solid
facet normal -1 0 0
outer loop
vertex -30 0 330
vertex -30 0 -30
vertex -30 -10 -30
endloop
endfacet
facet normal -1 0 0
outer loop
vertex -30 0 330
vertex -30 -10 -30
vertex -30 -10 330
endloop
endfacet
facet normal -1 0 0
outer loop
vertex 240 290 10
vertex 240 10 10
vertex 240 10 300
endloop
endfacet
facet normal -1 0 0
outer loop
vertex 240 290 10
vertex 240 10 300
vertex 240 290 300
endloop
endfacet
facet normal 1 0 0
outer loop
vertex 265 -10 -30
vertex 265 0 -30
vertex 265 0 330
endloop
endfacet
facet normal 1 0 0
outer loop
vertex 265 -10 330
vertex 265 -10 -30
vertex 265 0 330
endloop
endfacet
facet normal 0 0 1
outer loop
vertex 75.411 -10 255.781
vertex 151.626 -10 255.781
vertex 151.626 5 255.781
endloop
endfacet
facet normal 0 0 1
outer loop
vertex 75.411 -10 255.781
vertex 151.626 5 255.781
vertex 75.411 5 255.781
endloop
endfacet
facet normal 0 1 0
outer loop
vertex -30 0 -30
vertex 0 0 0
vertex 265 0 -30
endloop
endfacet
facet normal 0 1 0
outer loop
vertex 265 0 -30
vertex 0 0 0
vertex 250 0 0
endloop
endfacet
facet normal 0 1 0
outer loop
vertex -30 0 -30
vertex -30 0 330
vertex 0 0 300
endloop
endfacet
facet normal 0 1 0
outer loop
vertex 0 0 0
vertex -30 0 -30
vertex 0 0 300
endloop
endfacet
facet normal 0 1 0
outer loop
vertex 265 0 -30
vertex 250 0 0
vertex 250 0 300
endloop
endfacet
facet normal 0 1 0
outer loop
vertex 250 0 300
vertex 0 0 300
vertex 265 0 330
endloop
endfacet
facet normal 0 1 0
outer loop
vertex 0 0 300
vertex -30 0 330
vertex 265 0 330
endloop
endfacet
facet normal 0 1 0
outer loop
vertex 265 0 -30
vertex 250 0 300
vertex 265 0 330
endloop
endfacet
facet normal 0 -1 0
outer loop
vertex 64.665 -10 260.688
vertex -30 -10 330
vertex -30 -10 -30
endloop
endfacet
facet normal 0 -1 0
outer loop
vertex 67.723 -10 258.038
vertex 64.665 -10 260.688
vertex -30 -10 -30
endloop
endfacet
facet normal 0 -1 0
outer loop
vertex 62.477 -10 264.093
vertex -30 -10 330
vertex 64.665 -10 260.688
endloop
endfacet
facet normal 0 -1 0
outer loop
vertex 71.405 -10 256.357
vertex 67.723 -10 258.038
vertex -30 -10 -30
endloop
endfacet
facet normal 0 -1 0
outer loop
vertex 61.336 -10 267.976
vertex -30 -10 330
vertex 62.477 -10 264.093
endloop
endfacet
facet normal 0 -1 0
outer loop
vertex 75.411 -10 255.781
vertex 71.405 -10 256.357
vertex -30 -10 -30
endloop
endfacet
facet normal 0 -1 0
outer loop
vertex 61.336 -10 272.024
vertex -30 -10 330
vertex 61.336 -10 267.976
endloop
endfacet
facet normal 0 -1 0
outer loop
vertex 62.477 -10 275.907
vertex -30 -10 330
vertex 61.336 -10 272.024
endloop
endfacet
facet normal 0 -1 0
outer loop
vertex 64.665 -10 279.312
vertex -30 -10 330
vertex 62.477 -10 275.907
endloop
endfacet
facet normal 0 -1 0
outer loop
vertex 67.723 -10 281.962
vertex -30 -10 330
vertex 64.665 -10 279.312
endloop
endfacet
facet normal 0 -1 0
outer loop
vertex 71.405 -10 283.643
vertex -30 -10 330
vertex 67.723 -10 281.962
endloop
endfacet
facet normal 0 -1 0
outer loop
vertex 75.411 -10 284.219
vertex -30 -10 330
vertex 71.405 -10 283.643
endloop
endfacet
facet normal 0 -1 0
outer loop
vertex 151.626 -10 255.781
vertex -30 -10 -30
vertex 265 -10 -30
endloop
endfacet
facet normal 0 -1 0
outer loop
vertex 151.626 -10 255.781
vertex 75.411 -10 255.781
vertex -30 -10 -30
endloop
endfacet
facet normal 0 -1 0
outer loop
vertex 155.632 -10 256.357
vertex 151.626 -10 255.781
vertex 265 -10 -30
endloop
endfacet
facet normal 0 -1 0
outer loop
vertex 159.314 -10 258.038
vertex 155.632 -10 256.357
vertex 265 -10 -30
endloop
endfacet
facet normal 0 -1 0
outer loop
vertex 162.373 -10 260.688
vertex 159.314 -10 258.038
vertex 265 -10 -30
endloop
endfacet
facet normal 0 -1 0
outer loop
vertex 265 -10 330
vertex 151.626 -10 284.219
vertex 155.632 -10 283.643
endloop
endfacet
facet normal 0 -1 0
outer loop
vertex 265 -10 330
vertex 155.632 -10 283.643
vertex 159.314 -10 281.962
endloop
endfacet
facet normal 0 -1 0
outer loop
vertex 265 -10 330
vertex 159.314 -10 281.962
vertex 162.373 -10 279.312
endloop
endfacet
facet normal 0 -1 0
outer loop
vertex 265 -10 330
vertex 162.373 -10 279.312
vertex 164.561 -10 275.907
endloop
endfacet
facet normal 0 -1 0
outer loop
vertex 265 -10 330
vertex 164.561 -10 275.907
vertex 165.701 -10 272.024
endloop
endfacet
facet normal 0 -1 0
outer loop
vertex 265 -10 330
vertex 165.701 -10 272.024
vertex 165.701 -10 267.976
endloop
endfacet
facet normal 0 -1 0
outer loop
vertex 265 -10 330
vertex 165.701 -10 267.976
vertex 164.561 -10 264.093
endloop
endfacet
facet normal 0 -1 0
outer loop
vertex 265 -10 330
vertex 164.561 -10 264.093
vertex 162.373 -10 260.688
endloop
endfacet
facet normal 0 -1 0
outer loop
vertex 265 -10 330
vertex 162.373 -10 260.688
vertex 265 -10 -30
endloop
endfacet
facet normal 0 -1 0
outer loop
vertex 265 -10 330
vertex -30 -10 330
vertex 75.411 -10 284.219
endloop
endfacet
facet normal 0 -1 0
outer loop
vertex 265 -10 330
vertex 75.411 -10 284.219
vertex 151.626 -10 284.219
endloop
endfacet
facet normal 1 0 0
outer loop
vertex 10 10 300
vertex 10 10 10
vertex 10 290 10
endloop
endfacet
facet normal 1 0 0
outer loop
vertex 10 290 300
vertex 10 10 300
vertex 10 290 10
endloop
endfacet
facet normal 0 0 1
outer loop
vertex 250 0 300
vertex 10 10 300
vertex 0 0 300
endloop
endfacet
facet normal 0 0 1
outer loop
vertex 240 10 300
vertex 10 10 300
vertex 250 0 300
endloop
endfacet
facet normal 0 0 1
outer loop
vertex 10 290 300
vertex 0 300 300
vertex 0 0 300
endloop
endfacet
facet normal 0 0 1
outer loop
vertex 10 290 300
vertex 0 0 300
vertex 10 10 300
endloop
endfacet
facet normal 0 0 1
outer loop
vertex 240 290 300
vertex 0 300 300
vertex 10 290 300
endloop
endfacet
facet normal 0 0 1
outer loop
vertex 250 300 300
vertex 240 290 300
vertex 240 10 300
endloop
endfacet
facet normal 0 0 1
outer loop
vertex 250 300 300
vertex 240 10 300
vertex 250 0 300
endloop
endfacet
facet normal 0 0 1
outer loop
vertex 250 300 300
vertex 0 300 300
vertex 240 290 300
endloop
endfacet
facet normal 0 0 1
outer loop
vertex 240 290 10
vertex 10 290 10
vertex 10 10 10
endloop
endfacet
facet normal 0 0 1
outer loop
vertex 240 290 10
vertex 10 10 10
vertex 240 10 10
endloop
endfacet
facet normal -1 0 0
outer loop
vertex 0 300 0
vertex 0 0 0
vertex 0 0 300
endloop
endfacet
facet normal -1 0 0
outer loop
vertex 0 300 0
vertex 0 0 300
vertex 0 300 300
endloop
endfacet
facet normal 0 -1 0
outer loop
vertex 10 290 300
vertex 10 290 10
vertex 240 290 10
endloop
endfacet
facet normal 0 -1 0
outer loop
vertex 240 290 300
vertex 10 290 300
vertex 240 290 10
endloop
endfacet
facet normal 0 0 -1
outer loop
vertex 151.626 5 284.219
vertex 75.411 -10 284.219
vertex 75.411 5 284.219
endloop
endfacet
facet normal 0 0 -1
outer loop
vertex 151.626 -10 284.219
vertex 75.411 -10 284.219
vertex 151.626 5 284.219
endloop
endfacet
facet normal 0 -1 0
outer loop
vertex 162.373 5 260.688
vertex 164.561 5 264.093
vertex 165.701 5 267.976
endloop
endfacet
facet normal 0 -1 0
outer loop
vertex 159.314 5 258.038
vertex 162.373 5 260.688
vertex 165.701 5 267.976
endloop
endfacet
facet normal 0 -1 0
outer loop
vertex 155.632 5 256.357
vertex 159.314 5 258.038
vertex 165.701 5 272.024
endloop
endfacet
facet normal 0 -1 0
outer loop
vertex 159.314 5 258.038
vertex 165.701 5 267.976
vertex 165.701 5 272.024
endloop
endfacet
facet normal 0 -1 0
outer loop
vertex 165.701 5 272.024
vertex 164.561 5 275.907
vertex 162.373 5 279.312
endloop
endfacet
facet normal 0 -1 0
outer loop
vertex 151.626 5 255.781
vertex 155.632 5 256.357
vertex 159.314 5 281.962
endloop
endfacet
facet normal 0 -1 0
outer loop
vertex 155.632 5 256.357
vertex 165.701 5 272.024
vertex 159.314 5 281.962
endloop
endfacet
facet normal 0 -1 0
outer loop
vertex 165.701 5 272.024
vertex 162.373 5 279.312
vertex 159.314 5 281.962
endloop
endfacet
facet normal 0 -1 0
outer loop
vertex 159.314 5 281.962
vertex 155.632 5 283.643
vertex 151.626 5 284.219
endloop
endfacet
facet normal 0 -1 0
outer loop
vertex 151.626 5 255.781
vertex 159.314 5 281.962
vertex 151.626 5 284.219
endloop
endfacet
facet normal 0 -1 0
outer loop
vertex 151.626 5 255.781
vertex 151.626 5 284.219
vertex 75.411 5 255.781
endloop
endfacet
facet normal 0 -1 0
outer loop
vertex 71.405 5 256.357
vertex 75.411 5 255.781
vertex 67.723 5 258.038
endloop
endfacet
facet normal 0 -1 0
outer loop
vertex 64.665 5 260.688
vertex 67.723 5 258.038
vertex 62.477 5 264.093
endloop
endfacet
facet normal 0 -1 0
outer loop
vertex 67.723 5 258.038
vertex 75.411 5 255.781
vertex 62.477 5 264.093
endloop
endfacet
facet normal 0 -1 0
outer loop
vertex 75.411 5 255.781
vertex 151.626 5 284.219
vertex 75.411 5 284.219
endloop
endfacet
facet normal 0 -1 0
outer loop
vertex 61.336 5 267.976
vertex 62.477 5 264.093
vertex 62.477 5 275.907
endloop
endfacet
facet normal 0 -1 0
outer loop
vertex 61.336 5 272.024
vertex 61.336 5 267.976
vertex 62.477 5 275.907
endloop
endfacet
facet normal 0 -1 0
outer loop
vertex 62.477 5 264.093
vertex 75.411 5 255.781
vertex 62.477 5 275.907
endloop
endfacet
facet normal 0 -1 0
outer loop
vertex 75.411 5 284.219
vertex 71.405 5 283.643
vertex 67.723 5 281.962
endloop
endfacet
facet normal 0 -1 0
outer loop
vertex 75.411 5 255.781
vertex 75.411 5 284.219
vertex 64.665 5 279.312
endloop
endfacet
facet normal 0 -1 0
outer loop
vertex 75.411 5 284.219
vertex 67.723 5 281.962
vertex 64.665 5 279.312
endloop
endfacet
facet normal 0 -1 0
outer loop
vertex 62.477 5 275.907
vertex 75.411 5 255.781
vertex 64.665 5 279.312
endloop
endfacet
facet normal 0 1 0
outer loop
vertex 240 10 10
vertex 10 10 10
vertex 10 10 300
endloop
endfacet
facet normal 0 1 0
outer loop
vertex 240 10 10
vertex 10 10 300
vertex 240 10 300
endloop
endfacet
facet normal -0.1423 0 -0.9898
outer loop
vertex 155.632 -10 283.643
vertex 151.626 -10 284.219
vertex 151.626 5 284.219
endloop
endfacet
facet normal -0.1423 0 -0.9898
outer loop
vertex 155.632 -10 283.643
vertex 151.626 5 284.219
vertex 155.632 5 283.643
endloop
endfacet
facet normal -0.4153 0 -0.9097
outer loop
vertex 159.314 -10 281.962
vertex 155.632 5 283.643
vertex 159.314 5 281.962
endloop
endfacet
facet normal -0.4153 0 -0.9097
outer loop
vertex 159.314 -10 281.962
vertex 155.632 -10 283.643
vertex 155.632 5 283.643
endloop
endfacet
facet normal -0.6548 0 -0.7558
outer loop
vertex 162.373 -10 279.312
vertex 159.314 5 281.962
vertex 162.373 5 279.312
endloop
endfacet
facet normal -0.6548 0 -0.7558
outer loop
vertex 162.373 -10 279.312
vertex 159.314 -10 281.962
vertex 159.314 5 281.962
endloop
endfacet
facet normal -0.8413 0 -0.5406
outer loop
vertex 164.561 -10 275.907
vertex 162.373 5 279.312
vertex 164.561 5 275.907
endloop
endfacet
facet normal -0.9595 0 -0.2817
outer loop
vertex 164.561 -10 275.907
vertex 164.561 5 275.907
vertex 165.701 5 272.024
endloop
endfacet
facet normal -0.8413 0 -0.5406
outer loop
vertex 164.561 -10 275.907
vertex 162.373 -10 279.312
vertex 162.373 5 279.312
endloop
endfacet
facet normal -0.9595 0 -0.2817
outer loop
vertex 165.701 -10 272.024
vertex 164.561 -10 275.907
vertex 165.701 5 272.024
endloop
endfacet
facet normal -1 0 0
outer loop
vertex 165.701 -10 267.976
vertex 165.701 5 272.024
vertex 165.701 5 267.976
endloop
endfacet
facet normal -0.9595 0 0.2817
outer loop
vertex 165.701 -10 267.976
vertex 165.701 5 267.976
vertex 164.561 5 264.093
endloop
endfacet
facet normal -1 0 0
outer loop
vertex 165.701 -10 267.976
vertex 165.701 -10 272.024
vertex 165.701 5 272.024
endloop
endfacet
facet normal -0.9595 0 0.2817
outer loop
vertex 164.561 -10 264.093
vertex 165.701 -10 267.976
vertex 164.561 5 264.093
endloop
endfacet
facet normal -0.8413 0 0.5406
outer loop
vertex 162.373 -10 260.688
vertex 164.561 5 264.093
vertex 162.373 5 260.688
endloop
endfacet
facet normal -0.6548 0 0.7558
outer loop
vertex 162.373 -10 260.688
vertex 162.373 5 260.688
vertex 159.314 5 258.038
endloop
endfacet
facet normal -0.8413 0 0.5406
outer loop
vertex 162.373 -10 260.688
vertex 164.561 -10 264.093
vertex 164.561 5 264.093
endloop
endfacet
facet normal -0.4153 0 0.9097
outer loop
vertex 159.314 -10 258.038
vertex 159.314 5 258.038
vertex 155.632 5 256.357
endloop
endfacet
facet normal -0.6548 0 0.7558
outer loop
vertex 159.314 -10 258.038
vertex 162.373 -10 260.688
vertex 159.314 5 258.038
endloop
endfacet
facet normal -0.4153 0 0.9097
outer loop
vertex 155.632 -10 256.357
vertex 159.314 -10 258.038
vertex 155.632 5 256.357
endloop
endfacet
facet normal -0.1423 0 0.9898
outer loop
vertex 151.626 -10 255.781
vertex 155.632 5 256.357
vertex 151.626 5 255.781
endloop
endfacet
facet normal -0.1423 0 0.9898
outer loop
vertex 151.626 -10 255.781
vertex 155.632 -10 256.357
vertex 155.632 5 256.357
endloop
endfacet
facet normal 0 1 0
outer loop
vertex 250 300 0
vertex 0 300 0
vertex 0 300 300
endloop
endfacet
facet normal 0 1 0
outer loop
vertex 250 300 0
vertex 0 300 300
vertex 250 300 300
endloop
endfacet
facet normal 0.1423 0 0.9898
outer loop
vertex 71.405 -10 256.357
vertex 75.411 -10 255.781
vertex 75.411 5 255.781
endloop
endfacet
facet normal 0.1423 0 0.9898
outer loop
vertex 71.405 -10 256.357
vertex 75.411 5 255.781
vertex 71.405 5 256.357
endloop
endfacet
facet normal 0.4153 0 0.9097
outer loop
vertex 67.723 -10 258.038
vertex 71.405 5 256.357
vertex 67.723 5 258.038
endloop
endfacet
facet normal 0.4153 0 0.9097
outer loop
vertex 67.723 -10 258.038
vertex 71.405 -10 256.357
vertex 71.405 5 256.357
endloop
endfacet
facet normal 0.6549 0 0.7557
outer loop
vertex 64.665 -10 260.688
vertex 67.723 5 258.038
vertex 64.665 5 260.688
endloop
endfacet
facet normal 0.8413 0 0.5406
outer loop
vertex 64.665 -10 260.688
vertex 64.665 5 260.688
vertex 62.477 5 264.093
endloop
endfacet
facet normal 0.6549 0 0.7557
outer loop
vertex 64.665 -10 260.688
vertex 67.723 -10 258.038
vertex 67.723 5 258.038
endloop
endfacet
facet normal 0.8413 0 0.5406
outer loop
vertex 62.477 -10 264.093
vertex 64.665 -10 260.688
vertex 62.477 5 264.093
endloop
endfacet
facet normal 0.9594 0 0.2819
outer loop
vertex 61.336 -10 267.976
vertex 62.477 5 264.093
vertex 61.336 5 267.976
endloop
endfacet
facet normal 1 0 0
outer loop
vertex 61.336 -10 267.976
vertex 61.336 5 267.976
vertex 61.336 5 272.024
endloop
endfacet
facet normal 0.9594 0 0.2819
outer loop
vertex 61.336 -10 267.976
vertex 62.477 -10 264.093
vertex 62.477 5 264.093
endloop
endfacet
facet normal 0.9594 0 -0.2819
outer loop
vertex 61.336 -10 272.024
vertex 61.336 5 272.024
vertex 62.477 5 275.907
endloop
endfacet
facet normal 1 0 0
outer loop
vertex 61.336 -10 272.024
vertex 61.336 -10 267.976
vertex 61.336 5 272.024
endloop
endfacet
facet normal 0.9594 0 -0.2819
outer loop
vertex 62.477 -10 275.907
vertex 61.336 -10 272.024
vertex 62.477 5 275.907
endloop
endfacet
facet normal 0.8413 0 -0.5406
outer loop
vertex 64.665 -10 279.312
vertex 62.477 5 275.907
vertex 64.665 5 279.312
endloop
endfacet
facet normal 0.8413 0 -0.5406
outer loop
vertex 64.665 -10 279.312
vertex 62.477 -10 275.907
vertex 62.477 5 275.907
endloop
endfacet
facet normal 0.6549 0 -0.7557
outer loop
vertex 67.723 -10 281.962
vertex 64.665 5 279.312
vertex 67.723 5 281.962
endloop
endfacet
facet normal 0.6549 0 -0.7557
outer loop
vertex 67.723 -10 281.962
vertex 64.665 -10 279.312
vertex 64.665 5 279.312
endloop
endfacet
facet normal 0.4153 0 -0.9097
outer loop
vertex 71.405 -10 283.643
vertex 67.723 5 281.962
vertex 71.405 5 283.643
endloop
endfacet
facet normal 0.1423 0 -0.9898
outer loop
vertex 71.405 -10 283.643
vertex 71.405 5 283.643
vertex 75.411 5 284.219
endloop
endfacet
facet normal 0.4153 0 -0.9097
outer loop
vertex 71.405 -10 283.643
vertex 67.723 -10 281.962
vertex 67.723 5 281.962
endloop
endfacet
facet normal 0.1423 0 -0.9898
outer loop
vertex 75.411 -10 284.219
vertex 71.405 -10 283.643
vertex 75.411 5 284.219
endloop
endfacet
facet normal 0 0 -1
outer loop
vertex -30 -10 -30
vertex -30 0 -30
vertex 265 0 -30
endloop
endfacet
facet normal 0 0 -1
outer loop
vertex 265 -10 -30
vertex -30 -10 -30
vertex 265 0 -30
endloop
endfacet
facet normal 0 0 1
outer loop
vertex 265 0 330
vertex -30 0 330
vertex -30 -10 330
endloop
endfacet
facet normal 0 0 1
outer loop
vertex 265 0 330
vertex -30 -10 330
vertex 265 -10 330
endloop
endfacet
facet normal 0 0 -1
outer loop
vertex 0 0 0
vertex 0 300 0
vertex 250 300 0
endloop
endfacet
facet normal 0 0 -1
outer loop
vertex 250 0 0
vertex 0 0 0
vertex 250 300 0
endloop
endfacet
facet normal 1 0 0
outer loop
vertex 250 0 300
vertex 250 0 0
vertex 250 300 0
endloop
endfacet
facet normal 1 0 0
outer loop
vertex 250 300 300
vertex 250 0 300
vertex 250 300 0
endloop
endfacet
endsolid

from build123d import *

# Parameters (mm, degrees)
SKETCH_1_W          = 250
SKETCH_1_H          = 300
EXTRUDE_1_DEPTH     = 300
SKETCH_2_W          = 230
SKETCH_2_H          = 280
CUT_EXTRUDE_1_DEPTH = 290
SKETCH_3_W          = 295
SKETCH_3_H          = 360
EXTRUDE_2_DEPTH     = 10
CUT_EXTRUDE_2_DEPTH = 15


with BuildPart() as part:
    # 草图1 → 凸台-拉伸1 (new body)
    with BuildSketch(Plane.XY):
        with Locations((125, 150)):
            Rectangle(SKETCH_1_W, SKETCH_1_H)
    extrude(amount=EXTRUDE_1_DEPTH)

    # 草图2 → 切除-拉伸1 (cut)
    with BuildSketch(Plane.XY.offset(300)):
        with Locations((125, 150)):
            Rectangle(SKETCH_2_W, SKETCH_2_H)
    extrude(amount=-CUT_EXTRUDE_1_DEPTH, mode=Mode.SUBTRACT)

    # 草图3 → 凸台-拉伸2 (add)
    with BuildSketch(Plane.XZ):
        with Locations((117.5, 150)):
            Rectangle(SKETCH_3_W, SKETCH_3_H)
    extrude(amount=EXTRUDE_2_DEPTH)

    # 草图4 → 切除-拉伸2 (cut)
    with BuildSketch(Plane.XZ.offset(10)):
        with BuildLine():
            Line((75.410884938, 284.219295629), (151.62630951, 284.219295629))
            ThreePointArc((151.62630951, 284.219295629), (165.845605139, 270), (151.62630951, 255.780704371))
            Line((151.62630951, 255.780704371), (75.410884938, 255.780704371))
            ThreePointArc((75.410884938, 255.780704371), (61.191589309, 270), (75.410884938, 284.219295629))
        make_face()
    extrude(amount=-CUT_EXTRUDE_2_DEPTH, mode=Mode.SUBTRACT)


solid = part.part
